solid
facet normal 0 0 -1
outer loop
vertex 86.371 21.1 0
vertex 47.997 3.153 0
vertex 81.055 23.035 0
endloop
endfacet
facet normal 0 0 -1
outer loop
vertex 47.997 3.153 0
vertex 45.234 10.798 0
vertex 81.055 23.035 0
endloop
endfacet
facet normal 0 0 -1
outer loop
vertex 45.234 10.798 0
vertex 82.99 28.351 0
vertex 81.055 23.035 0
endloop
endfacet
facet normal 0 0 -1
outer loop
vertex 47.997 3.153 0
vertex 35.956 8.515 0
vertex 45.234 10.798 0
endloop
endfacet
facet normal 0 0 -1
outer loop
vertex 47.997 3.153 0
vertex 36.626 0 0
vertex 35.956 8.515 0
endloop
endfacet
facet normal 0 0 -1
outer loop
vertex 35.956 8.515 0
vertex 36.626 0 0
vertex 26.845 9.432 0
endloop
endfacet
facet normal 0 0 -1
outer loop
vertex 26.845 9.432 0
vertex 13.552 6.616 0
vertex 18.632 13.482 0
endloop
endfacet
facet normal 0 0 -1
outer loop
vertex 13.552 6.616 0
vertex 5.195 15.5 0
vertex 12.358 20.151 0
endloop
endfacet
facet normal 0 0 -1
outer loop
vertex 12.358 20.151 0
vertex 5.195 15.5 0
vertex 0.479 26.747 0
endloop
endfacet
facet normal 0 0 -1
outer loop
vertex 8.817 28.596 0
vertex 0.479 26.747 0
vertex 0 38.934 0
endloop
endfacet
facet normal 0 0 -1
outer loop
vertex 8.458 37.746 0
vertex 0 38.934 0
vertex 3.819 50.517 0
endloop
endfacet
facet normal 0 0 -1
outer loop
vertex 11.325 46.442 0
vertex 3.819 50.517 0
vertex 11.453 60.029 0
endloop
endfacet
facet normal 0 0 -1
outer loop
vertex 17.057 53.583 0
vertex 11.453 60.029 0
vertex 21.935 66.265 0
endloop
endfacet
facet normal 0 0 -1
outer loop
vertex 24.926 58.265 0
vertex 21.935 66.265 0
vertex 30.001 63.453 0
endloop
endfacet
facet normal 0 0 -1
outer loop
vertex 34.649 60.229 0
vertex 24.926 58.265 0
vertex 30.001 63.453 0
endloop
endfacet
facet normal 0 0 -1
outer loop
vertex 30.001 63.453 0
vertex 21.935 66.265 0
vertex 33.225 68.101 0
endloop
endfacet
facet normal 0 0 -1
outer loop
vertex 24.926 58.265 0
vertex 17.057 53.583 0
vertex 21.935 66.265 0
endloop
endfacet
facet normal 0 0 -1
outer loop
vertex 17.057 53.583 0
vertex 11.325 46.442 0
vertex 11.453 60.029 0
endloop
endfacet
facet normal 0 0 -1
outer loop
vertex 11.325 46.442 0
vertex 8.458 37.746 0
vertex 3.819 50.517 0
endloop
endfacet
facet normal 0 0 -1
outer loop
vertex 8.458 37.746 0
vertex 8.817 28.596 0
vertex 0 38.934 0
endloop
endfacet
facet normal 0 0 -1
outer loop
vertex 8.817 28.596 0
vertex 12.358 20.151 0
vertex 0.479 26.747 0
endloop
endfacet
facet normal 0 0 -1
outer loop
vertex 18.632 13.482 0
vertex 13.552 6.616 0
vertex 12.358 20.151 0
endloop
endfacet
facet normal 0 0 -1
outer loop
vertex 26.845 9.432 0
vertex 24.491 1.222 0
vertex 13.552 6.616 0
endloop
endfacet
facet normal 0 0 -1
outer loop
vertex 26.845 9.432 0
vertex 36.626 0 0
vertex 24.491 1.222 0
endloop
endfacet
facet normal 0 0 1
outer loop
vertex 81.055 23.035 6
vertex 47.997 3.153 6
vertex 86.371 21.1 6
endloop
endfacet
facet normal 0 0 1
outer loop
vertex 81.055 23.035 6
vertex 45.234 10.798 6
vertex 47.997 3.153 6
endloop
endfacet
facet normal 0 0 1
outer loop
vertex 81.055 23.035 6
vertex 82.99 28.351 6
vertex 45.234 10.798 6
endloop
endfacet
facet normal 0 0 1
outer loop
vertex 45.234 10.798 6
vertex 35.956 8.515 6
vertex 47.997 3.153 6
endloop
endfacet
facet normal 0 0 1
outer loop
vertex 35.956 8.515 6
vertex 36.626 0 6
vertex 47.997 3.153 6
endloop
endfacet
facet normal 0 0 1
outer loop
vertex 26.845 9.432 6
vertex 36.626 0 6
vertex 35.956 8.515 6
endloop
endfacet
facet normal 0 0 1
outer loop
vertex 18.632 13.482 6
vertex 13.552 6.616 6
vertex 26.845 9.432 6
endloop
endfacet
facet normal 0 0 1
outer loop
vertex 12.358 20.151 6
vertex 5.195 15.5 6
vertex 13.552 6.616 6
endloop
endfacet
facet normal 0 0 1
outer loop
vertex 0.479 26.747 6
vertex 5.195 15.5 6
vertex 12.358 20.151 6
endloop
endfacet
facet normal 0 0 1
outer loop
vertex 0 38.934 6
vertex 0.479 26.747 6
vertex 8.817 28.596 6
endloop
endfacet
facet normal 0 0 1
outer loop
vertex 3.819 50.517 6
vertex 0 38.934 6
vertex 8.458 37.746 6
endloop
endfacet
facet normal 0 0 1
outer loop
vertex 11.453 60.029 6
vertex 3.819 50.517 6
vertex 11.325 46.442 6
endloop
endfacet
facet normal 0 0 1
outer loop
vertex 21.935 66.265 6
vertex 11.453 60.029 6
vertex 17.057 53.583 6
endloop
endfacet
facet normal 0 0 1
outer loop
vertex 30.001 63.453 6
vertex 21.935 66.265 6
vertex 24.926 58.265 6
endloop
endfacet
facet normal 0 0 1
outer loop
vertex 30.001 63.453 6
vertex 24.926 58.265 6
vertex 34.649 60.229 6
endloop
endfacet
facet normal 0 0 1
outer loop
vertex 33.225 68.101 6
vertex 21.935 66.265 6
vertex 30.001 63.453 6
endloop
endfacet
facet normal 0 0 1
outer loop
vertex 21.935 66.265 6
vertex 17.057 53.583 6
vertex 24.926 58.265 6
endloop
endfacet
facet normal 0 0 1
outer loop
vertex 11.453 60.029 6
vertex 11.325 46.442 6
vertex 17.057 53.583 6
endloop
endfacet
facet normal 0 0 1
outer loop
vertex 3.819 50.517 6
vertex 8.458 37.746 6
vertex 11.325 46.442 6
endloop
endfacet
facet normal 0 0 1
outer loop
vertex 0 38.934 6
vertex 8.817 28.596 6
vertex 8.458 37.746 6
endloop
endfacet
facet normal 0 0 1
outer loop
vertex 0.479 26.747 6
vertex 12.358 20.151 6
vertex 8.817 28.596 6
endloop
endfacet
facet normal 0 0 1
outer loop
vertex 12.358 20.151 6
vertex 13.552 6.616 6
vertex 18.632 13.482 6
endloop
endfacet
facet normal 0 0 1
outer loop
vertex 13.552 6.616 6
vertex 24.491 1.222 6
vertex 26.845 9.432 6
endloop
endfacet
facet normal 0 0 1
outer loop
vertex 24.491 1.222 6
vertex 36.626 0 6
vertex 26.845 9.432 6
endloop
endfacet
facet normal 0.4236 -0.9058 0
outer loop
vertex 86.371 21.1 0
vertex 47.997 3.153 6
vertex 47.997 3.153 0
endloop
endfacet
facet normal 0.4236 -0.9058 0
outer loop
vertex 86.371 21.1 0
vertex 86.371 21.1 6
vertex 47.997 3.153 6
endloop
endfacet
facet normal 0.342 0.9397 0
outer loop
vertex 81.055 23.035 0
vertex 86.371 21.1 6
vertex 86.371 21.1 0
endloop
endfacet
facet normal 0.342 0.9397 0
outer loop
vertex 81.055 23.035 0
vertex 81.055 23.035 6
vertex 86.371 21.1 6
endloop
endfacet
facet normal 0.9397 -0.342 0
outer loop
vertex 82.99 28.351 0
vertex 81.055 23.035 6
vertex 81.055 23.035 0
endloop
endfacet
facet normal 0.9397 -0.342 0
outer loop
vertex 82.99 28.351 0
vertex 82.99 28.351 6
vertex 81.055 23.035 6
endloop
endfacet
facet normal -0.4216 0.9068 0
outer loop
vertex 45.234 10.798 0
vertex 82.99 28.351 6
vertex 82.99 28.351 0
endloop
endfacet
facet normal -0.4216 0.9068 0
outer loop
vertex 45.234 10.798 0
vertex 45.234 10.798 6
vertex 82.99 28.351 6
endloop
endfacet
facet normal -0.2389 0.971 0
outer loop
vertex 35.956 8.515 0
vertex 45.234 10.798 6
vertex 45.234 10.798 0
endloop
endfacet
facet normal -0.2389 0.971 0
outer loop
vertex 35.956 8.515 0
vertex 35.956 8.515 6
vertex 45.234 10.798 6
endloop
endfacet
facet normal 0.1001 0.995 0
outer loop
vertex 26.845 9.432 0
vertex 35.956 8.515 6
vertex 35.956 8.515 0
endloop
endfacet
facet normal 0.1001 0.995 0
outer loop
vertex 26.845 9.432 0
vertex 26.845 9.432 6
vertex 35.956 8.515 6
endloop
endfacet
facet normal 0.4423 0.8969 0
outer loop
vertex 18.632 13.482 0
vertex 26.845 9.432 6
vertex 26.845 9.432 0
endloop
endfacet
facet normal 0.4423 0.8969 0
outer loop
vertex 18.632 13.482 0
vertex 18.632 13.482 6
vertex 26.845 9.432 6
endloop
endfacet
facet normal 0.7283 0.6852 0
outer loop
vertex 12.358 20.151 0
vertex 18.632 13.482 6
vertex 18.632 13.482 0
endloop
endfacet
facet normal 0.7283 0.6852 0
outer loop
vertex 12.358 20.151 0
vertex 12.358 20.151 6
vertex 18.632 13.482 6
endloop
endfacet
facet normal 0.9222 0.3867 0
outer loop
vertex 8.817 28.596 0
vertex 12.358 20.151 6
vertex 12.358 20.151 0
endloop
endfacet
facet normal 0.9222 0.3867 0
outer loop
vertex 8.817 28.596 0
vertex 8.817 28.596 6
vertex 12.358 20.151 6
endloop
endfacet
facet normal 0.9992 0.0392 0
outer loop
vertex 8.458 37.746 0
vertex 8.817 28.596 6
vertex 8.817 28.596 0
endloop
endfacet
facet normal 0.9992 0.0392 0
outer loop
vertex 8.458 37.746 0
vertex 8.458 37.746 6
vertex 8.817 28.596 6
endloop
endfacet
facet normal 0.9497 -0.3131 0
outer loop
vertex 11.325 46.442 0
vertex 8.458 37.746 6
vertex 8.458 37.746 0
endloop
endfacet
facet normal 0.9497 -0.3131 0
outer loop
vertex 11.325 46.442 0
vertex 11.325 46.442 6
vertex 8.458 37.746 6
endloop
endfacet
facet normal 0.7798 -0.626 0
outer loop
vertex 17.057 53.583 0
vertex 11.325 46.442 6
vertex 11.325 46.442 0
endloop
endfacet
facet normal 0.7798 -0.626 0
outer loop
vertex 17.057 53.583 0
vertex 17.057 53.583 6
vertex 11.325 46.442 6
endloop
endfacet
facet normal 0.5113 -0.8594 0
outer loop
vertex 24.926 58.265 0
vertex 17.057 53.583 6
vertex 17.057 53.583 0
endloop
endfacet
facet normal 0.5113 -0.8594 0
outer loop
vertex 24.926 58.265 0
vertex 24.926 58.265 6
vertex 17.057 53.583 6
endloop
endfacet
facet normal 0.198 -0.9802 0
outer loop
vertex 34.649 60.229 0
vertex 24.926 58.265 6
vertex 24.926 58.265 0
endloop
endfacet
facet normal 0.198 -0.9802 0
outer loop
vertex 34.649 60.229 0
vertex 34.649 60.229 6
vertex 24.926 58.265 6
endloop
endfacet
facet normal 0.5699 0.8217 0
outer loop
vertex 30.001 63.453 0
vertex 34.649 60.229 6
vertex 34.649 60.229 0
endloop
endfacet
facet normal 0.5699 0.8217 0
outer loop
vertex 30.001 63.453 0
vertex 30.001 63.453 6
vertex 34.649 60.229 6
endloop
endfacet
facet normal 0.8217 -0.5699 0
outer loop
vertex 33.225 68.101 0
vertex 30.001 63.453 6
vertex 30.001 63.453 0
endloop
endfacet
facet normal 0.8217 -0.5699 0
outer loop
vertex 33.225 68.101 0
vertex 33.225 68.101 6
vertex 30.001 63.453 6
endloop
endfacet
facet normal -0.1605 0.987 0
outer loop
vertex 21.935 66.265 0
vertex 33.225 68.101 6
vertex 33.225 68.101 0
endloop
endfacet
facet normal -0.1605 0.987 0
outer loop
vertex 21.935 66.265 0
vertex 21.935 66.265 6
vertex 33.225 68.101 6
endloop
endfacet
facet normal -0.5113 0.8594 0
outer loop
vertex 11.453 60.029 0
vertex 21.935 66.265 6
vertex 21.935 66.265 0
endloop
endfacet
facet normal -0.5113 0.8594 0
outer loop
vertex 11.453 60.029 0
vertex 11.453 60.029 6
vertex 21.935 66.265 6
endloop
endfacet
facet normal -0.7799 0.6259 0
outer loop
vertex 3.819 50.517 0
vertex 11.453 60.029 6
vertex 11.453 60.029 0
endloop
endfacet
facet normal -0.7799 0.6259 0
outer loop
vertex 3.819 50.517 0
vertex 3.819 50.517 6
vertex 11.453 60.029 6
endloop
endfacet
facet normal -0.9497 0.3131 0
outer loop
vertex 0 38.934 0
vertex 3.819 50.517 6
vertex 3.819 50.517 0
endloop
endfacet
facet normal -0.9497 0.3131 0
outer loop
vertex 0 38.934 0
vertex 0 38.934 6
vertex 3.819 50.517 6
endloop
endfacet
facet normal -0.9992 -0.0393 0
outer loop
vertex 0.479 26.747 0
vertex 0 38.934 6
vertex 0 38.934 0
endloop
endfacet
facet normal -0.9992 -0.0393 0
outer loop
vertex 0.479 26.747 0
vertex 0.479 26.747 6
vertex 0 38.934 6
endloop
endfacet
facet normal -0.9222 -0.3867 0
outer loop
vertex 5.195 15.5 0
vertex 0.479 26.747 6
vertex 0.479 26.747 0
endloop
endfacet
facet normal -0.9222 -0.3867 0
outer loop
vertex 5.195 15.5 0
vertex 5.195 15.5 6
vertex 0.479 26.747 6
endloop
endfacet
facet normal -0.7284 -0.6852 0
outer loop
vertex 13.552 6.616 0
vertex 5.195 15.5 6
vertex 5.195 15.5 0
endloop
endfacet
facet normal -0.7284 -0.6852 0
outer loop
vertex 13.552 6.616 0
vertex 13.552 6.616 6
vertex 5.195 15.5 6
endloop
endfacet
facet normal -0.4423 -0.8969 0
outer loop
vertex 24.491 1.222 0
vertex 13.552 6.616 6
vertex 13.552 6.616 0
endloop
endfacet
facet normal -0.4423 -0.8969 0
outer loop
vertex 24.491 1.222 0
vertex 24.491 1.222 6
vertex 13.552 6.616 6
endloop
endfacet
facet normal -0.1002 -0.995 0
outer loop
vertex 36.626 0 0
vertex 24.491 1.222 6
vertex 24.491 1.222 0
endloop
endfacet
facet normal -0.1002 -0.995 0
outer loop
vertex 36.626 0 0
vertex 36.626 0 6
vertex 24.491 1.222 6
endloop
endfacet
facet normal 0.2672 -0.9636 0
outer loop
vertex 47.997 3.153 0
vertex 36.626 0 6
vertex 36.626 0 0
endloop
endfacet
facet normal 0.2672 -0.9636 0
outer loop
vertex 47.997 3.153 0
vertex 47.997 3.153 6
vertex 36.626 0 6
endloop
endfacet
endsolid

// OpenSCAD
$fn = 32;

// ----------------------------------------------------------------------
// Hook plate: curl radius 30 mm over 205 degrees, 8 mm thick band
// ----------------------------------------------------------------------

// --- parameters (mm) ---
profile_height = 6;       // extrusion height
profile_points = 26;      // points of the closed outline

profile = [[30.001, 63.453], [33.225, 68.101], [21.935, 66.265], [11.453, 60.029], [3.819, 50.517], [0, 38.934], [0.479, 26.747], [5.195, 15.5], [13.552, 6.616], [24.491, 1.222], [36.626, 0], [47.997, 3.153], [86.371, 21.1], [81.055, 23.035], [82.99, 28.351], [45.234, 10.798], [35.956, 8.515], [26.845, 9.432], [18.632, 13.482], [12.358, 20.151], [8.817, 28.596], [8.458, 37.746], [11.325, 46.442], [17.057, 53.583], [24.926, 58.265], [34.649, 60.229]];  // single closed polygon, 26 points, counter clockwise

// --- the one profile operation ---
linear_extrude(height = profile_height) polygon(points = profile);
